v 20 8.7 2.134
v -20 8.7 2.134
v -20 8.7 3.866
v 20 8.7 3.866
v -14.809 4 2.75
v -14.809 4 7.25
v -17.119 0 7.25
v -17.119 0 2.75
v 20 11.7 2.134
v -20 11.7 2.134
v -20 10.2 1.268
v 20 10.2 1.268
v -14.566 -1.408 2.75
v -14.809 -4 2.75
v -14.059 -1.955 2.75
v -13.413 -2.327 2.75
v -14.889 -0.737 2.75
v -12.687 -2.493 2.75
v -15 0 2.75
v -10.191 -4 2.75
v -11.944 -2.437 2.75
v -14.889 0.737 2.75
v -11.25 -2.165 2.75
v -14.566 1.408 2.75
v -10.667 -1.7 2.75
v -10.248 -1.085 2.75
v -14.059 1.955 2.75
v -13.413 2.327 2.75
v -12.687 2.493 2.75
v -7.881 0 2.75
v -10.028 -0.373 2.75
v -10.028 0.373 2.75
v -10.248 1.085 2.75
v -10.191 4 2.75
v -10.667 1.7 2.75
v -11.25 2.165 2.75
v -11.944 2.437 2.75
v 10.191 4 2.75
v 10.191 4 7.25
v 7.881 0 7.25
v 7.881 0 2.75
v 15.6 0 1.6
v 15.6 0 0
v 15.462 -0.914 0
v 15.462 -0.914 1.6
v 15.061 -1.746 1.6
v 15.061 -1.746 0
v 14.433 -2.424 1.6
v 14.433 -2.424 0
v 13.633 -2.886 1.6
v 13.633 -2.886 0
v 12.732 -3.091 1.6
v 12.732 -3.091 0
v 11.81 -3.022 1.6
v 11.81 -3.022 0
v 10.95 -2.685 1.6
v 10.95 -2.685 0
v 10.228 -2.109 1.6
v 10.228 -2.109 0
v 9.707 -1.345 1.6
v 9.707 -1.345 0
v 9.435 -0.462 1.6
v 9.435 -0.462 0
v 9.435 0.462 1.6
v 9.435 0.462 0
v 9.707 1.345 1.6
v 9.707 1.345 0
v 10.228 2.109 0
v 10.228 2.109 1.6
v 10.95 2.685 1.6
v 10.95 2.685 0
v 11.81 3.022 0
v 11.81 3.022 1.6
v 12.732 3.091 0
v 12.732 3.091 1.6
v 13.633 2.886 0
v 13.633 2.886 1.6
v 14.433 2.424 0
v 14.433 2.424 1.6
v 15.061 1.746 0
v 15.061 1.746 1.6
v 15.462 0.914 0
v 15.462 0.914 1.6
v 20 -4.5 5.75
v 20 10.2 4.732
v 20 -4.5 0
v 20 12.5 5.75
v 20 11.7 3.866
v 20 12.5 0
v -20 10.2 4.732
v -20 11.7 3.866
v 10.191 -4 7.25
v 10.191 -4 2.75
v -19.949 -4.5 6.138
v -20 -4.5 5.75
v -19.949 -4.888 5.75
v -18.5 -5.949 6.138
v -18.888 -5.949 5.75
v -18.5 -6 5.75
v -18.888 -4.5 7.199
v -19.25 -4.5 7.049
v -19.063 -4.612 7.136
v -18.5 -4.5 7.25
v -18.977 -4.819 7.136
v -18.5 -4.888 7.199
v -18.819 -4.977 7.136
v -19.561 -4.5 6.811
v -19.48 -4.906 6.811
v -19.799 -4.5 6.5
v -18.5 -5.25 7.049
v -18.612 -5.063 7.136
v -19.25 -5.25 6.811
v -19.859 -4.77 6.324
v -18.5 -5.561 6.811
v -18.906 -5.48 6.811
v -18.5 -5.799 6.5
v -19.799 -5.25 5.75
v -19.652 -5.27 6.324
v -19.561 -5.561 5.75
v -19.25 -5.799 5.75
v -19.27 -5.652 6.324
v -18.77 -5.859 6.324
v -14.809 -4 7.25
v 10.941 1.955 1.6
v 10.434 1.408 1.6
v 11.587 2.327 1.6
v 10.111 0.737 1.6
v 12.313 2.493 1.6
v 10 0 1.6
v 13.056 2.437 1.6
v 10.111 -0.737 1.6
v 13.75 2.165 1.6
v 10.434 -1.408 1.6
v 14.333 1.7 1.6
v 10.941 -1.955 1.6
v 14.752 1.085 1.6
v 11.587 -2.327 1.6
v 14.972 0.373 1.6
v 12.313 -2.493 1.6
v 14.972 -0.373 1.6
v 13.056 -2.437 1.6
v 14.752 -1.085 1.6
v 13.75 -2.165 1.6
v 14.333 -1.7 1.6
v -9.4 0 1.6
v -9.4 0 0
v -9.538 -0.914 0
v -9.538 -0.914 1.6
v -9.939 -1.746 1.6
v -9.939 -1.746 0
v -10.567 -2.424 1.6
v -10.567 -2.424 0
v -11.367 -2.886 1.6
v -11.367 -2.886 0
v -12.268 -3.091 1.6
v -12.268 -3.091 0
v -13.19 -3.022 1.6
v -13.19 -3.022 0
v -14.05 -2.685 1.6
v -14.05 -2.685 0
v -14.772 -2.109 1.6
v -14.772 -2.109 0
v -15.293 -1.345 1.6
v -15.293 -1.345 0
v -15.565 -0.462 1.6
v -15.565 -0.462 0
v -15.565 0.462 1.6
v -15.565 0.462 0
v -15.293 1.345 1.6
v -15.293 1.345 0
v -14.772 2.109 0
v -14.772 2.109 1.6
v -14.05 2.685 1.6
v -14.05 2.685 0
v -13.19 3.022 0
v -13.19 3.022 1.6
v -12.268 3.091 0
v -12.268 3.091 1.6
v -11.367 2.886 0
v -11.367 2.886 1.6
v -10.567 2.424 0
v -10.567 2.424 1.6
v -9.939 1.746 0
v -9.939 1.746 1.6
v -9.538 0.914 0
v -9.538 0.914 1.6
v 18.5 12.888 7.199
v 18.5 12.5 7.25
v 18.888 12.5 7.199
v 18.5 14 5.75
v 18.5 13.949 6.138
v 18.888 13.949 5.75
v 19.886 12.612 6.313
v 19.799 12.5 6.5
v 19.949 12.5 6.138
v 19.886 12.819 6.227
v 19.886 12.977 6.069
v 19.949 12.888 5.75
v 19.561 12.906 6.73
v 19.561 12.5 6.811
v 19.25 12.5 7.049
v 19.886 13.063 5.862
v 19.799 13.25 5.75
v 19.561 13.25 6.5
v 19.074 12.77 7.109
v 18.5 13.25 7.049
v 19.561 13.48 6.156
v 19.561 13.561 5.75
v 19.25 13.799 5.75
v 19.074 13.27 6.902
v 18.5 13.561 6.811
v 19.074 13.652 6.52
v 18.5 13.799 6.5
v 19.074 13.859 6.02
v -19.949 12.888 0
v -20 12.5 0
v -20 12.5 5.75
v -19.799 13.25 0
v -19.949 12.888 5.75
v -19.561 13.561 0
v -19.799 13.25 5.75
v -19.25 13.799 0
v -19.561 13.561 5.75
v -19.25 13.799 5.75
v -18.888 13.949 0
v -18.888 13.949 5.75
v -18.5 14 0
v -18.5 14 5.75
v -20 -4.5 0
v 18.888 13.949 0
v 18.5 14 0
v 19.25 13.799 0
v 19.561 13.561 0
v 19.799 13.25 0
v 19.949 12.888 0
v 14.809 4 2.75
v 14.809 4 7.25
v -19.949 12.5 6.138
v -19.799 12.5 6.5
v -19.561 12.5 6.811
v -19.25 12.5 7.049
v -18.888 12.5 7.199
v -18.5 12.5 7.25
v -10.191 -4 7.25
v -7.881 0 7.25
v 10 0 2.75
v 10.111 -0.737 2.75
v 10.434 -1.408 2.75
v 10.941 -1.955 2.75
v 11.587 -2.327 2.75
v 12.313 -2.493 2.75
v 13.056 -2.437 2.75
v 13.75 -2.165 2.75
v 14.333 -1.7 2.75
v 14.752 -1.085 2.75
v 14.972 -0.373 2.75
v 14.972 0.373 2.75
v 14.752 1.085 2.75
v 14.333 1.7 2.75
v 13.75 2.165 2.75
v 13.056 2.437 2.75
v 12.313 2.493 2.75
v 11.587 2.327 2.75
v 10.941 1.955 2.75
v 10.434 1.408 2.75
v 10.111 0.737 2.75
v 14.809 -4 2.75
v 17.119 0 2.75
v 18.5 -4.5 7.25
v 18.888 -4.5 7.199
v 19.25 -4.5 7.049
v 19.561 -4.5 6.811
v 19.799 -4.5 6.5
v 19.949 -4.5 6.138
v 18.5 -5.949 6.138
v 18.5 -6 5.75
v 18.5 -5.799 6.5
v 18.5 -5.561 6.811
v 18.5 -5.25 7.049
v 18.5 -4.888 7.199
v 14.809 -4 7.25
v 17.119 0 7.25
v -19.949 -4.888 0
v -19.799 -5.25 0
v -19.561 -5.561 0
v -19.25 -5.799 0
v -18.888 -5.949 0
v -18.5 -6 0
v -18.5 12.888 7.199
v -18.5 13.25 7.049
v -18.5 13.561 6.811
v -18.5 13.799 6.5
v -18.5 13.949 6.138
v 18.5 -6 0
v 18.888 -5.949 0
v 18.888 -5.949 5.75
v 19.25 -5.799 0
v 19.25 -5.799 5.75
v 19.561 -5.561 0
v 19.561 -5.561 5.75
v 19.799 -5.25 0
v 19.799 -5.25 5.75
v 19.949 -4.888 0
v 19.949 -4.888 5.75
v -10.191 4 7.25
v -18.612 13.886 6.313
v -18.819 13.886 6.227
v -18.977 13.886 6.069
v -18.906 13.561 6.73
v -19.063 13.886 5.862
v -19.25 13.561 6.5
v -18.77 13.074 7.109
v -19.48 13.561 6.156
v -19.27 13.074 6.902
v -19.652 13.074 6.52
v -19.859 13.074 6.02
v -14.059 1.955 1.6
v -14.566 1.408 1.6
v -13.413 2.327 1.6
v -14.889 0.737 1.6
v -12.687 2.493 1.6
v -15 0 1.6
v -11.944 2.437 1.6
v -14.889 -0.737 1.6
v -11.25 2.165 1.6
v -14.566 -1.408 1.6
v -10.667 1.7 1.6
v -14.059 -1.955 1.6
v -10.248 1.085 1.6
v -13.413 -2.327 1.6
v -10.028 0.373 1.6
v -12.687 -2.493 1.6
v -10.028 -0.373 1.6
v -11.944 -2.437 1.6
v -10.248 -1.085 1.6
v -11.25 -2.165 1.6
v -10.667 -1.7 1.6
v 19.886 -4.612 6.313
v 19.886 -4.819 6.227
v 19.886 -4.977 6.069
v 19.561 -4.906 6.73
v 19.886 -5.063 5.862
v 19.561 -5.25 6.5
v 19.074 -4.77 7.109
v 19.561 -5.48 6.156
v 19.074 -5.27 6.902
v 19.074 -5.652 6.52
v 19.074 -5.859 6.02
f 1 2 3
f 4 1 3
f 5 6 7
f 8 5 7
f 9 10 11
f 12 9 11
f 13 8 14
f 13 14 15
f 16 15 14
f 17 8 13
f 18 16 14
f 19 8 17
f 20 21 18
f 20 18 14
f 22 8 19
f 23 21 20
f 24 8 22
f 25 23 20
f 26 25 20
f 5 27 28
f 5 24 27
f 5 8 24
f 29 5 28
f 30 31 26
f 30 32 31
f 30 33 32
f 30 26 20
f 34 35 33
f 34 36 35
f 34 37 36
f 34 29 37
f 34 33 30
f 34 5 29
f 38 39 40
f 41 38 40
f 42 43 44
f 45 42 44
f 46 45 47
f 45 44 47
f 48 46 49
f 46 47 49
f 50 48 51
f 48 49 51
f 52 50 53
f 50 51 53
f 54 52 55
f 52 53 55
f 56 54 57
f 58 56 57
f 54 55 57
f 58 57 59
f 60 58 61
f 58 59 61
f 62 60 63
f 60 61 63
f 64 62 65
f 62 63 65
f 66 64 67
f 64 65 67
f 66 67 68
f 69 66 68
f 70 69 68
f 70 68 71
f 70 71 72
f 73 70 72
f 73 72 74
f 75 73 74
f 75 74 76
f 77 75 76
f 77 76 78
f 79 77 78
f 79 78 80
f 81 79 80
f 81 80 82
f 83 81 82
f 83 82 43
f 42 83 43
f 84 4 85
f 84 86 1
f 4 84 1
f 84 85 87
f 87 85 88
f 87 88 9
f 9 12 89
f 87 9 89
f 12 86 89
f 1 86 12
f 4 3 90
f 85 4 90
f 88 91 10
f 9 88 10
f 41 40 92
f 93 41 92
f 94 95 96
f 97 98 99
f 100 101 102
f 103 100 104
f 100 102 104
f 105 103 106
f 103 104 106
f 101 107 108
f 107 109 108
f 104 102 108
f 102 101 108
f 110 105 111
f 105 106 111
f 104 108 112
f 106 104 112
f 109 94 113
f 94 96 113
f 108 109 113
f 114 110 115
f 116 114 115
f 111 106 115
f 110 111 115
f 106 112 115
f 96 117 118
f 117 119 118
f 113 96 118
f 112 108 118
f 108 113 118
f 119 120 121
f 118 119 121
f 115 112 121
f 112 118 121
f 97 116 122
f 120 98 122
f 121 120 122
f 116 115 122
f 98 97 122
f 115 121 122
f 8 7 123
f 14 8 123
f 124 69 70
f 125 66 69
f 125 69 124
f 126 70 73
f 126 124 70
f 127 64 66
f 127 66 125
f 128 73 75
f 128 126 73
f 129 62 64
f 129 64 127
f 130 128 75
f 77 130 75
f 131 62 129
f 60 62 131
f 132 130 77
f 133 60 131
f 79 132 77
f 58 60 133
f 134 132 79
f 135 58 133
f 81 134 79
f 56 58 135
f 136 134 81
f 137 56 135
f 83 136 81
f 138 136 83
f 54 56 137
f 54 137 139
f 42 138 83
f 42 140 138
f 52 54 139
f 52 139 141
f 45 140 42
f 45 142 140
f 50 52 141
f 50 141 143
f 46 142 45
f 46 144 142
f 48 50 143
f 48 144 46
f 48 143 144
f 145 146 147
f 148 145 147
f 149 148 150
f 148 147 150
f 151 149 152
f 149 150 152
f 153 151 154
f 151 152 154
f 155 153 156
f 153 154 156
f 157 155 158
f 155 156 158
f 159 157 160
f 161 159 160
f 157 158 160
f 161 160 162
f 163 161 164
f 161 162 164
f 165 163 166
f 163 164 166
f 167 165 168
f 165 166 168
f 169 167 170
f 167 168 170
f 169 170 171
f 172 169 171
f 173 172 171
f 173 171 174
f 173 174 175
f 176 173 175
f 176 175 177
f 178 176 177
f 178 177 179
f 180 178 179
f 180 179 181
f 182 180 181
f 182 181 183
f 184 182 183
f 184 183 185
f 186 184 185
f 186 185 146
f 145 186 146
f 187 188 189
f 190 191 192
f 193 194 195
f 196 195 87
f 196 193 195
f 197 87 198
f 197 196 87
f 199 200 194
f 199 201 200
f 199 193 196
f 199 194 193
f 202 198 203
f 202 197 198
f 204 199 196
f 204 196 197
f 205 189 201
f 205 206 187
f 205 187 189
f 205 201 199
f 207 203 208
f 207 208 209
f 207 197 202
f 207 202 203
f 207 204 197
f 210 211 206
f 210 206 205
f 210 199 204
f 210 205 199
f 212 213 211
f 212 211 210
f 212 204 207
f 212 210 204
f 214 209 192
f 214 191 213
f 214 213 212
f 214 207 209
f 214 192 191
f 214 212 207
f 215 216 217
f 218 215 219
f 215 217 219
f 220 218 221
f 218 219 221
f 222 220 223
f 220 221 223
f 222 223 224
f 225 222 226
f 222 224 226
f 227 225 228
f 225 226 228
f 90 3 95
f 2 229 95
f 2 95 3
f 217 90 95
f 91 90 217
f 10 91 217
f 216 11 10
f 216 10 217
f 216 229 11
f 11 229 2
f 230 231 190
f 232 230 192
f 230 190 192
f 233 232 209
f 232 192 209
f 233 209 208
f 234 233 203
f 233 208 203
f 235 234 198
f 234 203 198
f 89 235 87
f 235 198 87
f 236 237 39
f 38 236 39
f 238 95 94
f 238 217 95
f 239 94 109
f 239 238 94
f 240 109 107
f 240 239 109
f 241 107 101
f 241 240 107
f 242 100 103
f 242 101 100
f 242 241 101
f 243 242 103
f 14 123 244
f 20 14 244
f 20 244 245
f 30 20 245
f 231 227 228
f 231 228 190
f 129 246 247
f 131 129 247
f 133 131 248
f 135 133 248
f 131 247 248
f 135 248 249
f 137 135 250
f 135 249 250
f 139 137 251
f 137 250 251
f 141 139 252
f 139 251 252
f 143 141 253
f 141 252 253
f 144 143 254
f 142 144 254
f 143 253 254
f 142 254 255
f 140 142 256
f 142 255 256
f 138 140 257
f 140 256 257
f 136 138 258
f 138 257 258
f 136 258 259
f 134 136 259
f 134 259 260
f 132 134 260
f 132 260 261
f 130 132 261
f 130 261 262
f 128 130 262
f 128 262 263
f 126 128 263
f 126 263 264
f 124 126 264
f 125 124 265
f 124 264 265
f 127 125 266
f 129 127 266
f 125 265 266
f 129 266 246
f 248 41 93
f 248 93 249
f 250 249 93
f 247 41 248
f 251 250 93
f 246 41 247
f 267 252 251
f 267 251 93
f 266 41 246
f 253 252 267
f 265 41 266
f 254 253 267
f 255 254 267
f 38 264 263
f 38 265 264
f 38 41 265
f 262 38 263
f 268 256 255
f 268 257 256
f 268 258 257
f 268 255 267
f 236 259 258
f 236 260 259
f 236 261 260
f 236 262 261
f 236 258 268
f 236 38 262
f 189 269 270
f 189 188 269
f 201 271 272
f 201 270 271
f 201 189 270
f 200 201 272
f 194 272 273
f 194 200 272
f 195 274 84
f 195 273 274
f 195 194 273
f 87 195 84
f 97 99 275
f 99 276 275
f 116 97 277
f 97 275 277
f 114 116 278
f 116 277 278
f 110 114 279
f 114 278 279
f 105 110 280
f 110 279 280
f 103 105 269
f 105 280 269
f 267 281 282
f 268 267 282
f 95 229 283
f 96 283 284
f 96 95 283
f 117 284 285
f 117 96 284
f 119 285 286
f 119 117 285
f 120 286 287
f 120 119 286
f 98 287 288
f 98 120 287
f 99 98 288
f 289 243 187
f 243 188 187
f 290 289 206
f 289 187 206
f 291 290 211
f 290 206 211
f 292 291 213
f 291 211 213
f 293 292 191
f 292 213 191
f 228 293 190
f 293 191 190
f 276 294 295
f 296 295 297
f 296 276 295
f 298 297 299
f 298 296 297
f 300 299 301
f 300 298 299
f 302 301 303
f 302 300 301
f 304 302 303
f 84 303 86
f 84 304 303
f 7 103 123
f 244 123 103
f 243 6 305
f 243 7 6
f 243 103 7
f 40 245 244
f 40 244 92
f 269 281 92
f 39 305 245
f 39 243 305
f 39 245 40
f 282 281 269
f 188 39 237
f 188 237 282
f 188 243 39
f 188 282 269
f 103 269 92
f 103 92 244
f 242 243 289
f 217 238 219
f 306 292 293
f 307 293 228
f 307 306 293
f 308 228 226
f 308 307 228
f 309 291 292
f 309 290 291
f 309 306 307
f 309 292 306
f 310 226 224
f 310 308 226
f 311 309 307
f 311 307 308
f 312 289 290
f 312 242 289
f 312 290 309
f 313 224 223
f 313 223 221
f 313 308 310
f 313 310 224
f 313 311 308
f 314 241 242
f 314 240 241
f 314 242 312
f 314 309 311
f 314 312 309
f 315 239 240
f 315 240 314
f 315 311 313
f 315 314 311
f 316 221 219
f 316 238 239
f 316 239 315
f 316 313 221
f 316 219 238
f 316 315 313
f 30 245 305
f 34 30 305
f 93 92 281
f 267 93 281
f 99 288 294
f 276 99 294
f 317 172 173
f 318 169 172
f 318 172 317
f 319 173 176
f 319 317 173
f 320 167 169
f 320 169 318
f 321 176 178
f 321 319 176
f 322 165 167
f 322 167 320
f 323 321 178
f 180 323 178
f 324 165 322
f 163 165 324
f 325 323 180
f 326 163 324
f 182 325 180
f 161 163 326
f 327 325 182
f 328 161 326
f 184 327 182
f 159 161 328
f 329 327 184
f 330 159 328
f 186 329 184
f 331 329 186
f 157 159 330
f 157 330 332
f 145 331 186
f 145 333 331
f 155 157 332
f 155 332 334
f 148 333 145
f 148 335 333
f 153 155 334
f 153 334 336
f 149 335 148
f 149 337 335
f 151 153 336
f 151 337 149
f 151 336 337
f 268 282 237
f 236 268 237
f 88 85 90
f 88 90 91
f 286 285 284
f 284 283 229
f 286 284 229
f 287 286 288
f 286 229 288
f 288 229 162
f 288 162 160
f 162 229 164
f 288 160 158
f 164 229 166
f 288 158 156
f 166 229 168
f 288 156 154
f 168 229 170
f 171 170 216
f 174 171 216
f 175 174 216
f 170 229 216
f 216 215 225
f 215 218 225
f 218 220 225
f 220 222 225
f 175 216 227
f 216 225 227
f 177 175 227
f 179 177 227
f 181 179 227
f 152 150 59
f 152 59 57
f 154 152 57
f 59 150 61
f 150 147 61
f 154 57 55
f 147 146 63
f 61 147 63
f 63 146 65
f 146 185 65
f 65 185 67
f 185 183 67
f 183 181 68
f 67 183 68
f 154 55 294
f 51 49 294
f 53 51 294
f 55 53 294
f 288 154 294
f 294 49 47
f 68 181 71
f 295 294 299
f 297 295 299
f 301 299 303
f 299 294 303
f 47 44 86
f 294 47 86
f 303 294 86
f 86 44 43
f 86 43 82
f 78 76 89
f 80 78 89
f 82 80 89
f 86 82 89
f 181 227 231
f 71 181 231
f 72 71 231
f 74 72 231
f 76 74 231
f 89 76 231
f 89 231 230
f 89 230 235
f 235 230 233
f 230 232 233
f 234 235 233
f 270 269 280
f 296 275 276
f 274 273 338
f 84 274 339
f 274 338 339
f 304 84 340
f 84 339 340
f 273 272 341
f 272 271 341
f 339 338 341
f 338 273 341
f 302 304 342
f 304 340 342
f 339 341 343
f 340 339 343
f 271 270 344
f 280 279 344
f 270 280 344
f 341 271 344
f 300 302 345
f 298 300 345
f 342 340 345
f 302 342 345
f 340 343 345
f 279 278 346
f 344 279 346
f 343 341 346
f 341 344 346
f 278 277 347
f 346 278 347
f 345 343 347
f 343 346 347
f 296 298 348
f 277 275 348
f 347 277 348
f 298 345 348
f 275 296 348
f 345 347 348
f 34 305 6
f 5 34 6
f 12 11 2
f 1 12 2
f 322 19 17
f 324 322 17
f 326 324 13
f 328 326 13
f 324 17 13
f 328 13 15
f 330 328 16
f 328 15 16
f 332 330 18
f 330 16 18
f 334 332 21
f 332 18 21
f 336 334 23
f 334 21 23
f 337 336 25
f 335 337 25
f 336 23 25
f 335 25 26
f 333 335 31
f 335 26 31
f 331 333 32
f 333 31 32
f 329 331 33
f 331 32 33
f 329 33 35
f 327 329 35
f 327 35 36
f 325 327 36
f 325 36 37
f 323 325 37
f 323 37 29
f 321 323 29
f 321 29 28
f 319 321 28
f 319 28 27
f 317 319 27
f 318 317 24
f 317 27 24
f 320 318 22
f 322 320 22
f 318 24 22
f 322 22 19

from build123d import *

# Parameters (mm, degrees)
SKETCH_W         = 40
SKETCH_H         = 20
PAD_DEPTH        = 7.25
HOLE_D           = 5
HOLE_DEPTH       = 25
HOLE_CBORE_D     = 6.2
HOLE_CBORE_DEPTH = 1.6
POCKET_DEPTH     = 4.5
POCKET001_DEPTH  = 40.001
FILLET_R         = 1.5


with BuildPart() as part:
    # Sketch → Pad (new body)
    with BuildSketch(Plane.XY):
        with Locations((0, 4)):
            Rectangle(SKETCH_W, SKETCH_H)
    extrude(amount=PAD_DEPTH)

    # Hole
    with Locations(Plane(origin=(0, 0, 0), x_dir=(1, 0, 0), z_dir=(0, 0, -1))):
        with Locations((-12.5, 0), (12.5, 0)):
            CounterBoreHole(HOLE_D / 2, HOLE_CBORE_D / 2, HOLE_CBORE_DEPTH, depth=HOLE_DEPTH)

    # Sketch002 (on Face5 of Hole) → Pocket (cut)
    with BuildSketch(Plane.XY.offset(7.25)):
        Polygon((-10.190599, 4), (-14.809401, 4), (-17.118802, 0), (-14.809401, -4), (-10.190599, -4), (-7.881198, 0), align=None)
        Polygon((10.190599, 4), (7.881198, 0), (10.190599, -4), (14.809401, -4), (17.118802, 0), (14.809401, 4), align=None)
    extrude(amount=-POCKET_DEPTH, mode=Mode.SUBTRACT)

    # Sketch003 (on Face2 of Pocket) → Pocket001 (cut, through all)
    with BuildSketch(Plane(origin=(-20, 0, 0), x_dir=(0, -1, 0), z_dir=(-1, 0, 0))):
        Polygon((-8.7, 3.866025), (-10.2, 4.732051), (-11.7, 3.866025), (-11.7, 2.133975), (-10.2, 1.267949), (-8.7, 2.133975), align=None)
    extrude(amount=-POCKET001_DEPTH, mode=Mode.SUBTRACT)

    # Fillet
    fillet_edges = [part.edges().sort_by_distance(p)[0] for p in [
        (-20, -6, 3.625),
        (-20, 4, 7.25),
        (0, 14, 7.25),
        (0, -6, 7.25),
        (-20, 14, 3.625),
        (20, 4, 7.25),
        (20, -6, 3.625),
        (20, 14, 3.625),
    ]]
    fillet(fillet_edges, radius=FILLET_R)


solid = part.part
